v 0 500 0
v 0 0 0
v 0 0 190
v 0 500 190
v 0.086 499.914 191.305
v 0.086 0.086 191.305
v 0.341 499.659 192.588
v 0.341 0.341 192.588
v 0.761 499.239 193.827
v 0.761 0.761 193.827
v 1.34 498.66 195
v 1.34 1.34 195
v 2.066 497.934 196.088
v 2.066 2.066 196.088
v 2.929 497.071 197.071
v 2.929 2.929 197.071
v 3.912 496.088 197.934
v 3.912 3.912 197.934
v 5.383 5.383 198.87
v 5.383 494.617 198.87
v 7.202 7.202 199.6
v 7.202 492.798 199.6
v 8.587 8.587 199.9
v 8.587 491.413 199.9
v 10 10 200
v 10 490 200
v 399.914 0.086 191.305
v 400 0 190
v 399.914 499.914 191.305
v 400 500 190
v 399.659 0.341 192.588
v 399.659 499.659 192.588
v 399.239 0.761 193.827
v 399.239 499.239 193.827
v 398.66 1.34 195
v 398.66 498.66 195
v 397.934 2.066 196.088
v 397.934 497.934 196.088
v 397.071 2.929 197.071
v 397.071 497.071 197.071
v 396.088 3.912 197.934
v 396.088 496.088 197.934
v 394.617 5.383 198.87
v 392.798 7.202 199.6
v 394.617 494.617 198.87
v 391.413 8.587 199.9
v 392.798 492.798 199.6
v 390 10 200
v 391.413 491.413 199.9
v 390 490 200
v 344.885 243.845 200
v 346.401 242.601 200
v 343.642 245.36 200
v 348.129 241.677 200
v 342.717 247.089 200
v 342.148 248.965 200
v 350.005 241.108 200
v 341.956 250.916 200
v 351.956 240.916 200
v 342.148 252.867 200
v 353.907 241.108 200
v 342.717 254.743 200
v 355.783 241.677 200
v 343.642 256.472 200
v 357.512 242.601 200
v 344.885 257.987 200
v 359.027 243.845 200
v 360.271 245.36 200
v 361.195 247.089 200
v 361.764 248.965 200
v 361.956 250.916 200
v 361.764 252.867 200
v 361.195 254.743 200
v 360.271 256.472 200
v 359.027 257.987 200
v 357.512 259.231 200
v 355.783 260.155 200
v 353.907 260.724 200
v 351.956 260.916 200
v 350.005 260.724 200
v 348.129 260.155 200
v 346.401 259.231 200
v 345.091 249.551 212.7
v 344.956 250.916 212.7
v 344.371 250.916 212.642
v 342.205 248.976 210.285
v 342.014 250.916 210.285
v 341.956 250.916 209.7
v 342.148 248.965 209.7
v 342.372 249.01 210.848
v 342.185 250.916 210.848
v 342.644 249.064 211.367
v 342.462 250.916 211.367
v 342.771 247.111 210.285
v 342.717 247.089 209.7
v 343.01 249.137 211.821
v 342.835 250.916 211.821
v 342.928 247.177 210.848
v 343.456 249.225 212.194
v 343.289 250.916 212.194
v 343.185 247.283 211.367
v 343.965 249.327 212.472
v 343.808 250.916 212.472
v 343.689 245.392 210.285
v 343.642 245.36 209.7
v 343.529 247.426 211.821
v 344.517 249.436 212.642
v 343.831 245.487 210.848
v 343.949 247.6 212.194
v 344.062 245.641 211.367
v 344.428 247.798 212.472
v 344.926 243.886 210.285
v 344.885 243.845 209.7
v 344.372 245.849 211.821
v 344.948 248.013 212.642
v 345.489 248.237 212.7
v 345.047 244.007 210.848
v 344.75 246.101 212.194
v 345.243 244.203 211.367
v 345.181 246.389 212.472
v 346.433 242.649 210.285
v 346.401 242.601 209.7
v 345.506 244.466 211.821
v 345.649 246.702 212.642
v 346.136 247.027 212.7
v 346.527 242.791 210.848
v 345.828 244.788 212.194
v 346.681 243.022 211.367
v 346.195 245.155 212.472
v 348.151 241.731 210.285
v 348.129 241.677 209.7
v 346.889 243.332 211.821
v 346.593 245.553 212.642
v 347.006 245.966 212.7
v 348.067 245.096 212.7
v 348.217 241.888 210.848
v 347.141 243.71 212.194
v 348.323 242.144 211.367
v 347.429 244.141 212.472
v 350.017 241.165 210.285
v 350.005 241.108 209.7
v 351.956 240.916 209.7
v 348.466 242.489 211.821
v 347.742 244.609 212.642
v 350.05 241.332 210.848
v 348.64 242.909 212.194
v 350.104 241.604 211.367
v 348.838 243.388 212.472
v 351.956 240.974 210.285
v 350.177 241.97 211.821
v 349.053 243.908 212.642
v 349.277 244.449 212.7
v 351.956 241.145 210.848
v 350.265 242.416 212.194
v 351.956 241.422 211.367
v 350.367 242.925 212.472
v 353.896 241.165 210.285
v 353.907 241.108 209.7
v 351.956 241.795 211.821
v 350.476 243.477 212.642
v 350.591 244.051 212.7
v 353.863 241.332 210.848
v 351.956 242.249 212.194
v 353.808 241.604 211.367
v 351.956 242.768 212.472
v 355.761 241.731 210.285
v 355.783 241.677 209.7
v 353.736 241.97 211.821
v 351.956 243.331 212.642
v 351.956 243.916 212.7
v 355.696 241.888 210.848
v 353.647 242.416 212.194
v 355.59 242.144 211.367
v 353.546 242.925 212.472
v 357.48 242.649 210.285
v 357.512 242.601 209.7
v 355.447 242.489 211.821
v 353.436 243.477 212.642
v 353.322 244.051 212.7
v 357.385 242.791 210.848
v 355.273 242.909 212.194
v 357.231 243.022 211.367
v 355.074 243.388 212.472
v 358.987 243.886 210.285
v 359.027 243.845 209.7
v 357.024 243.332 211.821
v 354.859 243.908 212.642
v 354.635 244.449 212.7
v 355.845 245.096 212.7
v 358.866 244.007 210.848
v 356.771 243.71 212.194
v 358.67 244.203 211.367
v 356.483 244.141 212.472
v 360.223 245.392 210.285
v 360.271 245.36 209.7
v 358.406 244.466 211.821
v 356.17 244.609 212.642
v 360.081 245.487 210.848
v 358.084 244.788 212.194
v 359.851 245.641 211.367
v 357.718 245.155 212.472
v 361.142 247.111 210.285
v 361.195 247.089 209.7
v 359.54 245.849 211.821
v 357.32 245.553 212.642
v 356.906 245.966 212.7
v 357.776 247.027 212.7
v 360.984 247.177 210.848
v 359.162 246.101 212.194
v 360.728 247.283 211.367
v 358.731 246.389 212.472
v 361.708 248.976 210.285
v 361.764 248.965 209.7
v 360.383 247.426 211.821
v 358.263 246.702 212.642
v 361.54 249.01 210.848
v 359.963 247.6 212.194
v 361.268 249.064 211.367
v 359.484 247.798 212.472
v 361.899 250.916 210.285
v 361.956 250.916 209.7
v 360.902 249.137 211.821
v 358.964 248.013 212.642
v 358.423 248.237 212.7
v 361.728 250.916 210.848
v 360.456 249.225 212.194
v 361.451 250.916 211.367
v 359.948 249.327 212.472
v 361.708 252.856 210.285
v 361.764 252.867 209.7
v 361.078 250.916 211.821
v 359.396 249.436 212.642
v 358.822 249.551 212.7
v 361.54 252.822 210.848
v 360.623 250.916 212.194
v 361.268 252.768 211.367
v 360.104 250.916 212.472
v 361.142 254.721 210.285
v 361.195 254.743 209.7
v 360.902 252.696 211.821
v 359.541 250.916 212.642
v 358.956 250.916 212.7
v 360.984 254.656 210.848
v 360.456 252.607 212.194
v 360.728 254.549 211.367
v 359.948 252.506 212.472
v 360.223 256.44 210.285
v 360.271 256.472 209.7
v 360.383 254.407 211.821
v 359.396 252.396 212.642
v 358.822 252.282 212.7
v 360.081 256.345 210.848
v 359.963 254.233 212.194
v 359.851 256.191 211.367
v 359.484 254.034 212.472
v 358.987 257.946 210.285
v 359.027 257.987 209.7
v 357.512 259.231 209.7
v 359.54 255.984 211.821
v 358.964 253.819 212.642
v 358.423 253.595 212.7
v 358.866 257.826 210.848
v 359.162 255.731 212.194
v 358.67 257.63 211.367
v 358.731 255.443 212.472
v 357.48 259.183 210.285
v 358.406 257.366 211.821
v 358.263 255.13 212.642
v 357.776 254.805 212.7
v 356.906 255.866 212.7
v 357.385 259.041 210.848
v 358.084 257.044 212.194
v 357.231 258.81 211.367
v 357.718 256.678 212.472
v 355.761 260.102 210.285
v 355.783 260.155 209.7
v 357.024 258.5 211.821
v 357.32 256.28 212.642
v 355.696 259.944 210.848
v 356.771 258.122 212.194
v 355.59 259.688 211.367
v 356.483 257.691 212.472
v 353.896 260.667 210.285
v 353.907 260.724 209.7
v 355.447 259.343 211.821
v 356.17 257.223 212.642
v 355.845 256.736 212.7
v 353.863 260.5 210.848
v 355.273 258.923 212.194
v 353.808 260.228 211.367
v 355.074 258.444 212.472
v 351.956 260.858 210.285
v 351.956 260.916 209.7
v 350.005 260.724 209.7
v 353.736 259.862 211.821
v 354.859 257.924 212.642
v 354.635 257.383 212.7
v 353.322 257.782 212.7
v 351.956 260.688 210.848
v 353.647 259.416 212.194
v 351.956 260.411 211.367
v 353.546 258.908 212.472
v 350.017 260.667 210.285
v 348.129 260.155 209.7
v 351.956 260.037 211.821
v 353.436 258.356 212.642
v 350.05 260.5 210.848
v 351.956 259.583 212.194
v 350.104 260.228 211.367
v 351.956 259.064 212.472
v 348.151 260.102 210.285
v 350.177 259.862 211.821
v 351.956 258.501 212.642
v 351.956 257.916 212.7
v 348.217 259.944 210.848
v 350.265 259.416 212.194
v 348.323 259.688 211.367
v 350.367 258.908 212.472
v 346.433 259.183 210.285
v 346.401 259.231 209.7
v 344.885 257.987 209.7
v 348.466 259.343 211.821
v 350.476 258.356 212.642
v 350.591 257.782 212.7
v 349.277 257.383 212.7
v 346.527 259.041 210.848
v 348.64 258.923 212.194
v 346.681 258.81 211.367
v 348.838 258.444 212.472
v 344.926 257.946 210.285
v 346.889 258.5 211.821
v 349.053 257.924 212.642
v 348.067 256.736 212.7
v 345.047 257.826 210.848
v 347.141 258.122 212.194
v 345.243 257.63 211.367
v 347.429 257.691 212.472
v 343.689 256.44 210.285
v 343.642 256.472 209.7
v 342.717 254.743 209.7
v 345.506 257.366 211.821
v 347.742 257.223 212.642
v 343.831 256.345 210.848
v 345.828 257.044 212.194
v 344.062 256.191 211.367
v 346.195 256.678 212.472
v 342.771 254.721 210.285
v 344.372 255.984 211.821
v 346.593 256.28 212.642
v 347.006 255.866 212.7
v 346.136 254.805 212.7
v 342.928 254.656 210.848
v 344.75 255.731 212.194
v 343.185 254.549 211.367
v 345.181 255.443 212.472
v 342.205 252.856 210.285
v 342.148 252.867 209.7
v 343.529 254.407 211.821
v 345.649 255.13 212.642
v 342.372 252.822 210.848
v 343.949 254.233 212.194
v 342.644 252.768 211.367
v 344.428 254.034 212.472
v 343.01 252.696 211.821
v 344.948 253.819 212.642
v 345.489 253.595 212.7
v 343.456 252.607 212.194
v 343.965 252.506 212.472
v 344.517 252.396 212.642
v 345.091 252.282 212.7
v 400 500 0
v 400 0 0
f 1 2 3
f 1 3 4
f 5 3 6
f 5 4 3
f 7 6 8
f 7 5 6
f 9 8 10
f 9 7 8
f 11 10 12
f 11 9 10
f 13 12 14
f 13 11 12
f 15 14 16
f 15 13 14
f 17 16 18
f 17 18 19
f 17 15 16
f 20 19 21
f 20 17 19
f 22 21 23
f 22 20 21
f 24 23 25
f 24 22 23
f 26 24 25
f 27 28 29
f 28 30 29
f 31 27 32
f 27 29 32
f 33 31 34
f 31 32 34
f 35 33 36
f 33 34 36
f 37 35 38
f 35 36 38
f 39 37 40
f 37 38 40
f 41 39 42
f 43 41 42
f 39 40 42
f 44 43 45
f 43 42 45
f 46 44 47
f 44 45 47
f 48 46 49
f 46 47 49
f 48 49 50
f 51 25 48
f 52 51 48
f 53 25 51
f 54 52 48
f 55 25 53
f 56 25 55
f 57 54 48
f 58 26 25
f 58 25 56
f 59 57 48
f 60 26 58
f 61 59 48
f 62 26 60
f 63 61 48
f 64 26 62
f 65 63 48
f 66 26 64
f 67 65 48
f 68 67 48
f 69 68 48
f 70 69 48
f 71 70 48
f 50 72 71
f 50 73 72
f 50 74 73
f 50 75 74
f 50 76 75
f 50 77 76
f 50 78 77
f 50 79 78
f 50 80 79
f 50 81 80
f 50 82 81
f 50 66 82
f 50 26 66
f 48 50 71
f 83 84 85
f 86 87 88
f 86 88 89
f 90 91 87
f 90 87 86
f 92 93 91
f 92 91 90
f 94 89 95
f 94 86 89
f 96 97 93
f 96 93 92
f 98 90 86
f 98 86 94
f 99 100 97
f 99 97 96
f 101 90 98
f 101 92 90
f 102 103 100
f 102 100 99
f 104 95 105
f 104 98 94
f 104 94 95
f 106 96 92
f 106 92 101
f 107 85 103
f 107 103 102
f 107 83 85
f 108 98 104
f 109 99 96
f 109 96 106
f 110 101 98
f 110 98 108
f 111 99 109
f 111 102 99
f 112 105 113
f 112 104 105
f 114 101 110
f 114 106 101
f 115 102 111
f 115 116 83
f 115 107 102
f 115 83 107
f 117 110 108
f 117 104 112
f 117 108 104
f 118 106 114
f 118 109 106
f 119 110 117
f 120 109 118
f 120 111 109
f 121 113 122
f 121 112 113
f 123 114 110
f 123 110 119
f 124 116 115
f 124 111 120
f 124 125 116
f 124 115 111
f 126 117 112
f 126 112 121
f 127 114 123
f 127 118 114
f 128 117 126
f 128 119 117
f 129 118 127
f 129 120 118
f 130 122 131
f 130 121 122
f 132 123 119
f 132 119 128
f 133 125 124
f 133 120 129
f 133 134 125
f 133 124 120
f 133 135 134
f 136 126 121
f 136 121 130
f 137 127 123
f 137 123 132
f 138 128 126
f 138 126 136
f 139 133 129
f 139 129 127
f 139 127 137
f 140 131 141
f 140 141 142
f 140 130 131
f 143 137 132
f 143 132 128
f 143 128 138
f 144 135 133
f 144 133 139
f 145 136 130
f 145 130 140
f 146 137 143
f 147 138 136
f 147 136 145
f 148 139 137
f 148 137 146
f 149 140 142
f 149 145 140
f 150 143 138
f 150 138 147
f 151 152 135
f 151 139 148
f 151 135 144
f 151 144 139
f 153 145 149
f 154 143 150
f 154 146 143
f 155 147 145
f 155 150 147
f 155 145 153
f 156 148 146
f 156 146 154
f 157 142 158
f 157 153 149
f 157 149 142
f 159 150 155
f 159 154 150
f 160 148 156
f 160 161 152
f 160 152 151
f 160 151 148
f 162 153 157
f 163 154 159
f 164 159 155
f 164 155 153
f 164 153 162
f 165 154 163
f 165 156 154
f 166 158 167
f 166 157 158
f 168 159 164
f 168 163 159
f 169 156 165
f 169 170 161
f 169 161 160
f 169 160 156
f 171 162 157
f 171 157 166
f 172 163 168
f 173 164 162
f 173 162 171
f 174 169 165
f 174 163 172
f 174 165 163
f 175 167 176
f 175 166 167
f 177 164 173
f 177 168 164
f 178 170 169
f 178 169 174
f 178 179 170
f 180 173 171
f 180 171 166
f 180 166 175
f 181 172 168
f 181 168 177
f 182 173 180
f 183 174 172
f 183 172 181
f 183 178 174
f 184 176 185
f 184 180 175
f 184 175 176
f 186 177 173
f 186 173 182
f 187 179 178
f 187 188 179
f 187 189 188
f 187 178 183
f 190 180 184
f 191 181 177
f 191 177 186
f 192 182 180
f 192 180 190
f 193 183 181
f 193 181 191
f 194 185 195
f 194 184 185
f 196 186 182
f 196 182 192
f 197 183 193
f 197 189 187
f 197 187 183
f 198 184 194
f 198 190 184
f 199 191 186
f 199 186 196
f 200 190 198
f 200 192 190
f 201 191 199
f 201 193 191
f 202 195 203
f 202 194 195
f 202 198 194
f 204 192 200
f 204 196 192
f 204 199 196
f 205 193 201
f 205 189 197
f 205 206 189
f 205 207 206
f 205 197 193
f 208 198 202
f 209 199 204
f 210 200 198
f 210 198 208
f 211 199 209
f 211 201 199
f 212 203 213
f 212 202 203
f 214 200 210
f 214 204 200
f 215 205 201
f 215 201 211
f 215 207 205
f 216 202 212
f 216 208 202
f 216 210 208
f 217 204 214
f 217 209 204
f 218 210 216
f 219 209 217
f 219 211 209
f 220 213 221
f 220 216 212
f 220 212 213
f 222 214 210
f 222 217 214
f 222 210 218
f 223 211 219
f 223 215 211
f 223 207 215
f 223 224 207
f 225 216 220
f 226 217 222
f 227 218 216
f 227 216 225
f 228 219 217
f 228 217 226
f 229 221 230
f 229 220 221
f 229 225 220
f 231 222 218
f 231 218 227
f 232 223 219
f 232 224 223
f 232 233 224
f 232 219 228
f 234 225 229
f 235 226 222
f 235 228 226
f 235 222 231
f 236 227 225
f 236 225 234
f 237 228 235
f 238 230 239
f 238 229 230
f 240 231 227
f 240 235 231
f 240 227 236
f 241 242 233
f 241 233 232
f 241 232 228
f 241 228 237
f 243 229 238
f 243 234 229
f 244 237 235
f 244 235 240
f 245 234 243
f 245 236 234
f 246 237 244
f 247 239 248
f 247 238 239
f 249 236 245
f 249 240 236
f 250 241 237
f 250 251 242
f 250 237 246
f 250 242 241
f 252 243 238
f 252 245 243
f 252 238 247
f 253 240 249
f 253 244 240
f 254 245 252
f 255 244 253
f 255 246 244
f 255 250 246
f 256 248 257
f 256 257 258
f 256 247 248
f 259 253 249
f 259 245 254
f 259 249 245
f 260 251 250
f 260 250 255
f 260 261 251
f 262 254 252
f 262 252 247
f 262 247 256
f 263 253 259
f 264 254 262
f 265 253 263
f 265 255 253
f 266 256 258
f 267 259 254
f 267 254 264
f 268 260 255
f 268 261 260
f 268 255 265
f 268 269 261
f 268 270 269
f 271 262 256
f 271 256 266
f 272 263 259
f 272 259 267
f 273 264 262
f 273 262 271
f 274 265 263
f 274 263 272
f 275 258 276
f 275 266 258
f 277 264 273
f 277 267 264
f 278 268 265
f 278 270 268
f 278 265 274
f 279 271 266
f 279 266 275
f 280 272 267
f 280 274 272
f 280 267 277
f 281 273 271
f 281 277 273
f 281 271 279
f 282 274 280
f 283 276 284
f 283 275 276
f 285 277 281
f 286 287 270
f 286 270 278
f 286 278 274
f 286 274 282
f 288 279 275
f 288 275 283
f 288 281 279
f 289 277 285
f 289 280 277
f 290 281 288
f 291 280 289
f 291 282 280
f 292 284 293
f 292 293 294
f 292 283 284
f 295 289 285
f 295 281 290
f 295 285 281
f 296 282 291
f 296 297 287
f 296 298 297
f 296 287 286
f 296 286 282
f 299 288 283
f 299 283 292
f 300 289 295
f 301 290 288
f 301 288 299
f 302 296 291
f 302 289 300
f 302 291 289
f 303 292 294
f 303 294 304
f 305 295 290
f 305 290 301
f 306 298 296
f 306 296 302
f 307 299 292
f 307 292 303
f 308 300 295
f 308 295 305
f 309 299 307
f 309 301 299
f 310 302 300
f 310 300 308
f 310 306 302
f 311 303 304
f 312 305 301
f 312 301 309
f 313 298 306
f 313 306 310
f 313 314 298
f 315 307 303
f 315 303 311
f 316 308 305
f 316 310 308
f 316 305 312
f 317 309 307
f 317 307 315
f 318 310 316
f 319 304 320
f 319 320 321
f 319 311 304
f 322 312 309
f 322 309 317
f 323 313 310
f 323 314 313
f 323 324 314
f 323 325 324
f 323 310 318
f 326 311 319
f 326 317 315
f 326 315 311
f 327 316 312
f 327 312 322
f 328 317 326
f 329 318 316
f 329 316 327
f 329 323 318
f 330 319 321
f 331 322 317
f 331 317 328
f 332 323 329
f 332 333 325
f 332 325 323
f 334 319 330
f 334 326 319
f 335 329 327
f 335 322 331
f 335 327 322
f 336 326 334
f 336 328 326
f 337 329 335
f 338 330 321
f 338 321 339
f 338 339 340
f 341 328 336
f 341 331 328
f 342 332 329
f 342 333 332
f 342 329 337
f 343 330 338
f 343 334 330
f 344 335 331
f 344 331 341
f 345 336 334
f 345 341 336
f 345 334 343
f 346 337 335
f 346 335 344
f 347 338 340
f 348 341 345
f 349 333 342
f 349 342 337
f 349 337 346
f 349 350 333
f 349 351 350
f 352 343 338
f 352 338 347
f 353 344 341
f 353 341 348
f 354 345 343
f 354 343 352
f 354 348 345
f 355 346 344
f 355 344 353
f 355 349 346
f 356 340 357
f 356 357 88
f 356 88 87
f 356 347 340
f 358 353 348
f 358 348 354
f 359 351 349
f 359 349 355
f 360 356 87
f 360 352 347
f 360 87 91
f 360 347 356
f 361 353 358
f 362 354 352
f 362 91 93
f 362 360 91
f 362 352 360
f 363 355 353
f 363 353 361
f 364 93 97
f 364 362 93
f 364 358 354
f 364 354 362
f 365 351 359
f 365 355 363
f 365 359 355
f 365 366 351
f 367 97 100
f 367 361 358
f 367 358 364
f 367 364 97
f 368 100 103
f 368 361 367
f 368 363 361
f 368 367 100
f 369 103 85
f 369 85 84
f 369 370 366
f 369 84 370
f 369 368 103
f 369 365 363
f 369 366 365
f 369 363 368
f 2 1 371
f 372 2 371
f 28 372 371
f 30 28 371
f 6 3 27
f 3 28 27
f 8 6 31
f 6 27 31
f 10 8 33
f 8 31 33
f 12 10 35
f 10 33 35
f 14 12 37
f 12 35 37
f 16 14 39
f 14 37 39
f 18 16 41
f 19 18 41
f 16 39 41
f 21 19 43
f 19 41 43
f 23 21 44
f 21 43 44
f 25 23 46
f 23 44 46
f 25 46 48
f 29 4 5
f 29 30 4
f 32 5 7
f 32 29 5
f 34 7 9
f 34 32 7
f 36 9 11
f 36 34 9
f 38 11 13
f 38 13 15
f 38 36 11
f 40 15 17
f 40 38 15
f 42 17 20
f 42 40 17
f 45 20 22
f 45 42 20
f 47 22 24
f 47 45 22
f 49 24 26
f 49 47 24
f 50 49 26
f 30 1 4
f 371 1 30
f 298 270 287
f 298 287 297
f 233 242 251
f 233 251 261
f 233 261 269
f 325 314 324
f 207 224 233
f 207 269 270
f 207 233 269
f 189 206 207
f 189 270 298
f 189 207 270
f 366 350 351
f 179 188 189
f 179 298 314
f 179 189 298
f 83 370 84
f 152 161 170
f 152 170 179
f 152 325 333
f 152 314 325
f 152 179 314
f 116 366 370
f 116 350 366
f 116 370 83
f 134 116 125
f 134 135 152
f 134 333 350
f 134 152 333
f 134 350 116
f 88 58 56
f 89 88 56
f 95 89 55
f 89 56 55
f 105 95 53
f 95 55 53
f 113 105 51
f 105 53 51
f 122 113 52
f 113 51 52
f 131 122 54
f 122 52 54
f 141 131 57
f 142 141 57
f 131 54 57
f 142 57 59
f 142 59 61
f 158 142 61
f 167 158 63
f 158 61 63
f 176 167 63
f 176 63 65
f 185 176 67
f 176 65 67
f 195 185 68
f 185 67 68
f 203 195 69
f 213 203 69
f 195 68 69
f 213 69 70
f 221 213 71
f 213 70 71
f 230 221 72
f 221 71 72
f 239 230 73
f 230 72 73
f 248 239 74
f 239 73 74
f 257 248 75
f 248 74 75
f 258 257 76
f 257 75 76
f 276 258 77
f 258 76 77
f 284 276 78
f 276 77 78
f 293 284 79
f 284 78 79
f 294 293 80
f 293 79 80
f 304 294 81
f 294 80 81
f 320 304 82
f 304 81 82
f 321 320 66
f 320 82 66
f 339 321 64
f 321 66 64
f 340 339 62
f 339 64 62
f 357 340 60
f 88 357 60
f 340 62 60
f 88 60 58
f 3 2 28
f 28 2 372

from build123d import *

# Parameters (mm, degrees)
CROQUIS1_W              = 400
CROQUIS1_H              = 500
SALIENTE_EXTRUIR1_DEPTH = 200
REDONDEO1_R             = 10
CROQUIS2_R              = 10
SALIENTE_EXTRUIR2_DEPTH = 12.7
REDONDEO2_R             = 3


with BuildPart() as part:
    # Croquis1 → Saliente-Extruir1 (new body)
    with BuildSketch(Plane.XY):
        with Locations((200, 250)):
            Rectangle(CROQUIS1_W, CROQUIS1_H)
    extrude(amount=SALIENTE_EXTRUIR1_DEPTH)

    # Redondeo1
    redondeo1_edges = [part.edges().sort_by_distance(p)[0] for p in [
        (400, 250, 200),
        (200, 500, 200),
        (0, 250, 200),
        (200, 0, 200),
    ]]
    fillet(redondeo1_edges, radius=REDONDEO1_R)

    # Croquis2 → Saliente-Extruir2 (add)
    with BuildSketch(Plane.XY.offset(200)):
        with Locations(Location((351.956210027, 250.916140829, 0), (0, 0, 180))):
            Circle(CROQUIS2_R)
    extrude(amount=SALIENTE_EXTRUIR2_DEPTH)

    # Redondeo2
    redondeo2_edges = [part.edges().sort_by_distance(p)[0] for p in [
        (361.956210027, 250.916140829, 212.7),
    ]]
    fillet(redondeo2_edges, radius=REDONDEO2_R)


solid = part.part
